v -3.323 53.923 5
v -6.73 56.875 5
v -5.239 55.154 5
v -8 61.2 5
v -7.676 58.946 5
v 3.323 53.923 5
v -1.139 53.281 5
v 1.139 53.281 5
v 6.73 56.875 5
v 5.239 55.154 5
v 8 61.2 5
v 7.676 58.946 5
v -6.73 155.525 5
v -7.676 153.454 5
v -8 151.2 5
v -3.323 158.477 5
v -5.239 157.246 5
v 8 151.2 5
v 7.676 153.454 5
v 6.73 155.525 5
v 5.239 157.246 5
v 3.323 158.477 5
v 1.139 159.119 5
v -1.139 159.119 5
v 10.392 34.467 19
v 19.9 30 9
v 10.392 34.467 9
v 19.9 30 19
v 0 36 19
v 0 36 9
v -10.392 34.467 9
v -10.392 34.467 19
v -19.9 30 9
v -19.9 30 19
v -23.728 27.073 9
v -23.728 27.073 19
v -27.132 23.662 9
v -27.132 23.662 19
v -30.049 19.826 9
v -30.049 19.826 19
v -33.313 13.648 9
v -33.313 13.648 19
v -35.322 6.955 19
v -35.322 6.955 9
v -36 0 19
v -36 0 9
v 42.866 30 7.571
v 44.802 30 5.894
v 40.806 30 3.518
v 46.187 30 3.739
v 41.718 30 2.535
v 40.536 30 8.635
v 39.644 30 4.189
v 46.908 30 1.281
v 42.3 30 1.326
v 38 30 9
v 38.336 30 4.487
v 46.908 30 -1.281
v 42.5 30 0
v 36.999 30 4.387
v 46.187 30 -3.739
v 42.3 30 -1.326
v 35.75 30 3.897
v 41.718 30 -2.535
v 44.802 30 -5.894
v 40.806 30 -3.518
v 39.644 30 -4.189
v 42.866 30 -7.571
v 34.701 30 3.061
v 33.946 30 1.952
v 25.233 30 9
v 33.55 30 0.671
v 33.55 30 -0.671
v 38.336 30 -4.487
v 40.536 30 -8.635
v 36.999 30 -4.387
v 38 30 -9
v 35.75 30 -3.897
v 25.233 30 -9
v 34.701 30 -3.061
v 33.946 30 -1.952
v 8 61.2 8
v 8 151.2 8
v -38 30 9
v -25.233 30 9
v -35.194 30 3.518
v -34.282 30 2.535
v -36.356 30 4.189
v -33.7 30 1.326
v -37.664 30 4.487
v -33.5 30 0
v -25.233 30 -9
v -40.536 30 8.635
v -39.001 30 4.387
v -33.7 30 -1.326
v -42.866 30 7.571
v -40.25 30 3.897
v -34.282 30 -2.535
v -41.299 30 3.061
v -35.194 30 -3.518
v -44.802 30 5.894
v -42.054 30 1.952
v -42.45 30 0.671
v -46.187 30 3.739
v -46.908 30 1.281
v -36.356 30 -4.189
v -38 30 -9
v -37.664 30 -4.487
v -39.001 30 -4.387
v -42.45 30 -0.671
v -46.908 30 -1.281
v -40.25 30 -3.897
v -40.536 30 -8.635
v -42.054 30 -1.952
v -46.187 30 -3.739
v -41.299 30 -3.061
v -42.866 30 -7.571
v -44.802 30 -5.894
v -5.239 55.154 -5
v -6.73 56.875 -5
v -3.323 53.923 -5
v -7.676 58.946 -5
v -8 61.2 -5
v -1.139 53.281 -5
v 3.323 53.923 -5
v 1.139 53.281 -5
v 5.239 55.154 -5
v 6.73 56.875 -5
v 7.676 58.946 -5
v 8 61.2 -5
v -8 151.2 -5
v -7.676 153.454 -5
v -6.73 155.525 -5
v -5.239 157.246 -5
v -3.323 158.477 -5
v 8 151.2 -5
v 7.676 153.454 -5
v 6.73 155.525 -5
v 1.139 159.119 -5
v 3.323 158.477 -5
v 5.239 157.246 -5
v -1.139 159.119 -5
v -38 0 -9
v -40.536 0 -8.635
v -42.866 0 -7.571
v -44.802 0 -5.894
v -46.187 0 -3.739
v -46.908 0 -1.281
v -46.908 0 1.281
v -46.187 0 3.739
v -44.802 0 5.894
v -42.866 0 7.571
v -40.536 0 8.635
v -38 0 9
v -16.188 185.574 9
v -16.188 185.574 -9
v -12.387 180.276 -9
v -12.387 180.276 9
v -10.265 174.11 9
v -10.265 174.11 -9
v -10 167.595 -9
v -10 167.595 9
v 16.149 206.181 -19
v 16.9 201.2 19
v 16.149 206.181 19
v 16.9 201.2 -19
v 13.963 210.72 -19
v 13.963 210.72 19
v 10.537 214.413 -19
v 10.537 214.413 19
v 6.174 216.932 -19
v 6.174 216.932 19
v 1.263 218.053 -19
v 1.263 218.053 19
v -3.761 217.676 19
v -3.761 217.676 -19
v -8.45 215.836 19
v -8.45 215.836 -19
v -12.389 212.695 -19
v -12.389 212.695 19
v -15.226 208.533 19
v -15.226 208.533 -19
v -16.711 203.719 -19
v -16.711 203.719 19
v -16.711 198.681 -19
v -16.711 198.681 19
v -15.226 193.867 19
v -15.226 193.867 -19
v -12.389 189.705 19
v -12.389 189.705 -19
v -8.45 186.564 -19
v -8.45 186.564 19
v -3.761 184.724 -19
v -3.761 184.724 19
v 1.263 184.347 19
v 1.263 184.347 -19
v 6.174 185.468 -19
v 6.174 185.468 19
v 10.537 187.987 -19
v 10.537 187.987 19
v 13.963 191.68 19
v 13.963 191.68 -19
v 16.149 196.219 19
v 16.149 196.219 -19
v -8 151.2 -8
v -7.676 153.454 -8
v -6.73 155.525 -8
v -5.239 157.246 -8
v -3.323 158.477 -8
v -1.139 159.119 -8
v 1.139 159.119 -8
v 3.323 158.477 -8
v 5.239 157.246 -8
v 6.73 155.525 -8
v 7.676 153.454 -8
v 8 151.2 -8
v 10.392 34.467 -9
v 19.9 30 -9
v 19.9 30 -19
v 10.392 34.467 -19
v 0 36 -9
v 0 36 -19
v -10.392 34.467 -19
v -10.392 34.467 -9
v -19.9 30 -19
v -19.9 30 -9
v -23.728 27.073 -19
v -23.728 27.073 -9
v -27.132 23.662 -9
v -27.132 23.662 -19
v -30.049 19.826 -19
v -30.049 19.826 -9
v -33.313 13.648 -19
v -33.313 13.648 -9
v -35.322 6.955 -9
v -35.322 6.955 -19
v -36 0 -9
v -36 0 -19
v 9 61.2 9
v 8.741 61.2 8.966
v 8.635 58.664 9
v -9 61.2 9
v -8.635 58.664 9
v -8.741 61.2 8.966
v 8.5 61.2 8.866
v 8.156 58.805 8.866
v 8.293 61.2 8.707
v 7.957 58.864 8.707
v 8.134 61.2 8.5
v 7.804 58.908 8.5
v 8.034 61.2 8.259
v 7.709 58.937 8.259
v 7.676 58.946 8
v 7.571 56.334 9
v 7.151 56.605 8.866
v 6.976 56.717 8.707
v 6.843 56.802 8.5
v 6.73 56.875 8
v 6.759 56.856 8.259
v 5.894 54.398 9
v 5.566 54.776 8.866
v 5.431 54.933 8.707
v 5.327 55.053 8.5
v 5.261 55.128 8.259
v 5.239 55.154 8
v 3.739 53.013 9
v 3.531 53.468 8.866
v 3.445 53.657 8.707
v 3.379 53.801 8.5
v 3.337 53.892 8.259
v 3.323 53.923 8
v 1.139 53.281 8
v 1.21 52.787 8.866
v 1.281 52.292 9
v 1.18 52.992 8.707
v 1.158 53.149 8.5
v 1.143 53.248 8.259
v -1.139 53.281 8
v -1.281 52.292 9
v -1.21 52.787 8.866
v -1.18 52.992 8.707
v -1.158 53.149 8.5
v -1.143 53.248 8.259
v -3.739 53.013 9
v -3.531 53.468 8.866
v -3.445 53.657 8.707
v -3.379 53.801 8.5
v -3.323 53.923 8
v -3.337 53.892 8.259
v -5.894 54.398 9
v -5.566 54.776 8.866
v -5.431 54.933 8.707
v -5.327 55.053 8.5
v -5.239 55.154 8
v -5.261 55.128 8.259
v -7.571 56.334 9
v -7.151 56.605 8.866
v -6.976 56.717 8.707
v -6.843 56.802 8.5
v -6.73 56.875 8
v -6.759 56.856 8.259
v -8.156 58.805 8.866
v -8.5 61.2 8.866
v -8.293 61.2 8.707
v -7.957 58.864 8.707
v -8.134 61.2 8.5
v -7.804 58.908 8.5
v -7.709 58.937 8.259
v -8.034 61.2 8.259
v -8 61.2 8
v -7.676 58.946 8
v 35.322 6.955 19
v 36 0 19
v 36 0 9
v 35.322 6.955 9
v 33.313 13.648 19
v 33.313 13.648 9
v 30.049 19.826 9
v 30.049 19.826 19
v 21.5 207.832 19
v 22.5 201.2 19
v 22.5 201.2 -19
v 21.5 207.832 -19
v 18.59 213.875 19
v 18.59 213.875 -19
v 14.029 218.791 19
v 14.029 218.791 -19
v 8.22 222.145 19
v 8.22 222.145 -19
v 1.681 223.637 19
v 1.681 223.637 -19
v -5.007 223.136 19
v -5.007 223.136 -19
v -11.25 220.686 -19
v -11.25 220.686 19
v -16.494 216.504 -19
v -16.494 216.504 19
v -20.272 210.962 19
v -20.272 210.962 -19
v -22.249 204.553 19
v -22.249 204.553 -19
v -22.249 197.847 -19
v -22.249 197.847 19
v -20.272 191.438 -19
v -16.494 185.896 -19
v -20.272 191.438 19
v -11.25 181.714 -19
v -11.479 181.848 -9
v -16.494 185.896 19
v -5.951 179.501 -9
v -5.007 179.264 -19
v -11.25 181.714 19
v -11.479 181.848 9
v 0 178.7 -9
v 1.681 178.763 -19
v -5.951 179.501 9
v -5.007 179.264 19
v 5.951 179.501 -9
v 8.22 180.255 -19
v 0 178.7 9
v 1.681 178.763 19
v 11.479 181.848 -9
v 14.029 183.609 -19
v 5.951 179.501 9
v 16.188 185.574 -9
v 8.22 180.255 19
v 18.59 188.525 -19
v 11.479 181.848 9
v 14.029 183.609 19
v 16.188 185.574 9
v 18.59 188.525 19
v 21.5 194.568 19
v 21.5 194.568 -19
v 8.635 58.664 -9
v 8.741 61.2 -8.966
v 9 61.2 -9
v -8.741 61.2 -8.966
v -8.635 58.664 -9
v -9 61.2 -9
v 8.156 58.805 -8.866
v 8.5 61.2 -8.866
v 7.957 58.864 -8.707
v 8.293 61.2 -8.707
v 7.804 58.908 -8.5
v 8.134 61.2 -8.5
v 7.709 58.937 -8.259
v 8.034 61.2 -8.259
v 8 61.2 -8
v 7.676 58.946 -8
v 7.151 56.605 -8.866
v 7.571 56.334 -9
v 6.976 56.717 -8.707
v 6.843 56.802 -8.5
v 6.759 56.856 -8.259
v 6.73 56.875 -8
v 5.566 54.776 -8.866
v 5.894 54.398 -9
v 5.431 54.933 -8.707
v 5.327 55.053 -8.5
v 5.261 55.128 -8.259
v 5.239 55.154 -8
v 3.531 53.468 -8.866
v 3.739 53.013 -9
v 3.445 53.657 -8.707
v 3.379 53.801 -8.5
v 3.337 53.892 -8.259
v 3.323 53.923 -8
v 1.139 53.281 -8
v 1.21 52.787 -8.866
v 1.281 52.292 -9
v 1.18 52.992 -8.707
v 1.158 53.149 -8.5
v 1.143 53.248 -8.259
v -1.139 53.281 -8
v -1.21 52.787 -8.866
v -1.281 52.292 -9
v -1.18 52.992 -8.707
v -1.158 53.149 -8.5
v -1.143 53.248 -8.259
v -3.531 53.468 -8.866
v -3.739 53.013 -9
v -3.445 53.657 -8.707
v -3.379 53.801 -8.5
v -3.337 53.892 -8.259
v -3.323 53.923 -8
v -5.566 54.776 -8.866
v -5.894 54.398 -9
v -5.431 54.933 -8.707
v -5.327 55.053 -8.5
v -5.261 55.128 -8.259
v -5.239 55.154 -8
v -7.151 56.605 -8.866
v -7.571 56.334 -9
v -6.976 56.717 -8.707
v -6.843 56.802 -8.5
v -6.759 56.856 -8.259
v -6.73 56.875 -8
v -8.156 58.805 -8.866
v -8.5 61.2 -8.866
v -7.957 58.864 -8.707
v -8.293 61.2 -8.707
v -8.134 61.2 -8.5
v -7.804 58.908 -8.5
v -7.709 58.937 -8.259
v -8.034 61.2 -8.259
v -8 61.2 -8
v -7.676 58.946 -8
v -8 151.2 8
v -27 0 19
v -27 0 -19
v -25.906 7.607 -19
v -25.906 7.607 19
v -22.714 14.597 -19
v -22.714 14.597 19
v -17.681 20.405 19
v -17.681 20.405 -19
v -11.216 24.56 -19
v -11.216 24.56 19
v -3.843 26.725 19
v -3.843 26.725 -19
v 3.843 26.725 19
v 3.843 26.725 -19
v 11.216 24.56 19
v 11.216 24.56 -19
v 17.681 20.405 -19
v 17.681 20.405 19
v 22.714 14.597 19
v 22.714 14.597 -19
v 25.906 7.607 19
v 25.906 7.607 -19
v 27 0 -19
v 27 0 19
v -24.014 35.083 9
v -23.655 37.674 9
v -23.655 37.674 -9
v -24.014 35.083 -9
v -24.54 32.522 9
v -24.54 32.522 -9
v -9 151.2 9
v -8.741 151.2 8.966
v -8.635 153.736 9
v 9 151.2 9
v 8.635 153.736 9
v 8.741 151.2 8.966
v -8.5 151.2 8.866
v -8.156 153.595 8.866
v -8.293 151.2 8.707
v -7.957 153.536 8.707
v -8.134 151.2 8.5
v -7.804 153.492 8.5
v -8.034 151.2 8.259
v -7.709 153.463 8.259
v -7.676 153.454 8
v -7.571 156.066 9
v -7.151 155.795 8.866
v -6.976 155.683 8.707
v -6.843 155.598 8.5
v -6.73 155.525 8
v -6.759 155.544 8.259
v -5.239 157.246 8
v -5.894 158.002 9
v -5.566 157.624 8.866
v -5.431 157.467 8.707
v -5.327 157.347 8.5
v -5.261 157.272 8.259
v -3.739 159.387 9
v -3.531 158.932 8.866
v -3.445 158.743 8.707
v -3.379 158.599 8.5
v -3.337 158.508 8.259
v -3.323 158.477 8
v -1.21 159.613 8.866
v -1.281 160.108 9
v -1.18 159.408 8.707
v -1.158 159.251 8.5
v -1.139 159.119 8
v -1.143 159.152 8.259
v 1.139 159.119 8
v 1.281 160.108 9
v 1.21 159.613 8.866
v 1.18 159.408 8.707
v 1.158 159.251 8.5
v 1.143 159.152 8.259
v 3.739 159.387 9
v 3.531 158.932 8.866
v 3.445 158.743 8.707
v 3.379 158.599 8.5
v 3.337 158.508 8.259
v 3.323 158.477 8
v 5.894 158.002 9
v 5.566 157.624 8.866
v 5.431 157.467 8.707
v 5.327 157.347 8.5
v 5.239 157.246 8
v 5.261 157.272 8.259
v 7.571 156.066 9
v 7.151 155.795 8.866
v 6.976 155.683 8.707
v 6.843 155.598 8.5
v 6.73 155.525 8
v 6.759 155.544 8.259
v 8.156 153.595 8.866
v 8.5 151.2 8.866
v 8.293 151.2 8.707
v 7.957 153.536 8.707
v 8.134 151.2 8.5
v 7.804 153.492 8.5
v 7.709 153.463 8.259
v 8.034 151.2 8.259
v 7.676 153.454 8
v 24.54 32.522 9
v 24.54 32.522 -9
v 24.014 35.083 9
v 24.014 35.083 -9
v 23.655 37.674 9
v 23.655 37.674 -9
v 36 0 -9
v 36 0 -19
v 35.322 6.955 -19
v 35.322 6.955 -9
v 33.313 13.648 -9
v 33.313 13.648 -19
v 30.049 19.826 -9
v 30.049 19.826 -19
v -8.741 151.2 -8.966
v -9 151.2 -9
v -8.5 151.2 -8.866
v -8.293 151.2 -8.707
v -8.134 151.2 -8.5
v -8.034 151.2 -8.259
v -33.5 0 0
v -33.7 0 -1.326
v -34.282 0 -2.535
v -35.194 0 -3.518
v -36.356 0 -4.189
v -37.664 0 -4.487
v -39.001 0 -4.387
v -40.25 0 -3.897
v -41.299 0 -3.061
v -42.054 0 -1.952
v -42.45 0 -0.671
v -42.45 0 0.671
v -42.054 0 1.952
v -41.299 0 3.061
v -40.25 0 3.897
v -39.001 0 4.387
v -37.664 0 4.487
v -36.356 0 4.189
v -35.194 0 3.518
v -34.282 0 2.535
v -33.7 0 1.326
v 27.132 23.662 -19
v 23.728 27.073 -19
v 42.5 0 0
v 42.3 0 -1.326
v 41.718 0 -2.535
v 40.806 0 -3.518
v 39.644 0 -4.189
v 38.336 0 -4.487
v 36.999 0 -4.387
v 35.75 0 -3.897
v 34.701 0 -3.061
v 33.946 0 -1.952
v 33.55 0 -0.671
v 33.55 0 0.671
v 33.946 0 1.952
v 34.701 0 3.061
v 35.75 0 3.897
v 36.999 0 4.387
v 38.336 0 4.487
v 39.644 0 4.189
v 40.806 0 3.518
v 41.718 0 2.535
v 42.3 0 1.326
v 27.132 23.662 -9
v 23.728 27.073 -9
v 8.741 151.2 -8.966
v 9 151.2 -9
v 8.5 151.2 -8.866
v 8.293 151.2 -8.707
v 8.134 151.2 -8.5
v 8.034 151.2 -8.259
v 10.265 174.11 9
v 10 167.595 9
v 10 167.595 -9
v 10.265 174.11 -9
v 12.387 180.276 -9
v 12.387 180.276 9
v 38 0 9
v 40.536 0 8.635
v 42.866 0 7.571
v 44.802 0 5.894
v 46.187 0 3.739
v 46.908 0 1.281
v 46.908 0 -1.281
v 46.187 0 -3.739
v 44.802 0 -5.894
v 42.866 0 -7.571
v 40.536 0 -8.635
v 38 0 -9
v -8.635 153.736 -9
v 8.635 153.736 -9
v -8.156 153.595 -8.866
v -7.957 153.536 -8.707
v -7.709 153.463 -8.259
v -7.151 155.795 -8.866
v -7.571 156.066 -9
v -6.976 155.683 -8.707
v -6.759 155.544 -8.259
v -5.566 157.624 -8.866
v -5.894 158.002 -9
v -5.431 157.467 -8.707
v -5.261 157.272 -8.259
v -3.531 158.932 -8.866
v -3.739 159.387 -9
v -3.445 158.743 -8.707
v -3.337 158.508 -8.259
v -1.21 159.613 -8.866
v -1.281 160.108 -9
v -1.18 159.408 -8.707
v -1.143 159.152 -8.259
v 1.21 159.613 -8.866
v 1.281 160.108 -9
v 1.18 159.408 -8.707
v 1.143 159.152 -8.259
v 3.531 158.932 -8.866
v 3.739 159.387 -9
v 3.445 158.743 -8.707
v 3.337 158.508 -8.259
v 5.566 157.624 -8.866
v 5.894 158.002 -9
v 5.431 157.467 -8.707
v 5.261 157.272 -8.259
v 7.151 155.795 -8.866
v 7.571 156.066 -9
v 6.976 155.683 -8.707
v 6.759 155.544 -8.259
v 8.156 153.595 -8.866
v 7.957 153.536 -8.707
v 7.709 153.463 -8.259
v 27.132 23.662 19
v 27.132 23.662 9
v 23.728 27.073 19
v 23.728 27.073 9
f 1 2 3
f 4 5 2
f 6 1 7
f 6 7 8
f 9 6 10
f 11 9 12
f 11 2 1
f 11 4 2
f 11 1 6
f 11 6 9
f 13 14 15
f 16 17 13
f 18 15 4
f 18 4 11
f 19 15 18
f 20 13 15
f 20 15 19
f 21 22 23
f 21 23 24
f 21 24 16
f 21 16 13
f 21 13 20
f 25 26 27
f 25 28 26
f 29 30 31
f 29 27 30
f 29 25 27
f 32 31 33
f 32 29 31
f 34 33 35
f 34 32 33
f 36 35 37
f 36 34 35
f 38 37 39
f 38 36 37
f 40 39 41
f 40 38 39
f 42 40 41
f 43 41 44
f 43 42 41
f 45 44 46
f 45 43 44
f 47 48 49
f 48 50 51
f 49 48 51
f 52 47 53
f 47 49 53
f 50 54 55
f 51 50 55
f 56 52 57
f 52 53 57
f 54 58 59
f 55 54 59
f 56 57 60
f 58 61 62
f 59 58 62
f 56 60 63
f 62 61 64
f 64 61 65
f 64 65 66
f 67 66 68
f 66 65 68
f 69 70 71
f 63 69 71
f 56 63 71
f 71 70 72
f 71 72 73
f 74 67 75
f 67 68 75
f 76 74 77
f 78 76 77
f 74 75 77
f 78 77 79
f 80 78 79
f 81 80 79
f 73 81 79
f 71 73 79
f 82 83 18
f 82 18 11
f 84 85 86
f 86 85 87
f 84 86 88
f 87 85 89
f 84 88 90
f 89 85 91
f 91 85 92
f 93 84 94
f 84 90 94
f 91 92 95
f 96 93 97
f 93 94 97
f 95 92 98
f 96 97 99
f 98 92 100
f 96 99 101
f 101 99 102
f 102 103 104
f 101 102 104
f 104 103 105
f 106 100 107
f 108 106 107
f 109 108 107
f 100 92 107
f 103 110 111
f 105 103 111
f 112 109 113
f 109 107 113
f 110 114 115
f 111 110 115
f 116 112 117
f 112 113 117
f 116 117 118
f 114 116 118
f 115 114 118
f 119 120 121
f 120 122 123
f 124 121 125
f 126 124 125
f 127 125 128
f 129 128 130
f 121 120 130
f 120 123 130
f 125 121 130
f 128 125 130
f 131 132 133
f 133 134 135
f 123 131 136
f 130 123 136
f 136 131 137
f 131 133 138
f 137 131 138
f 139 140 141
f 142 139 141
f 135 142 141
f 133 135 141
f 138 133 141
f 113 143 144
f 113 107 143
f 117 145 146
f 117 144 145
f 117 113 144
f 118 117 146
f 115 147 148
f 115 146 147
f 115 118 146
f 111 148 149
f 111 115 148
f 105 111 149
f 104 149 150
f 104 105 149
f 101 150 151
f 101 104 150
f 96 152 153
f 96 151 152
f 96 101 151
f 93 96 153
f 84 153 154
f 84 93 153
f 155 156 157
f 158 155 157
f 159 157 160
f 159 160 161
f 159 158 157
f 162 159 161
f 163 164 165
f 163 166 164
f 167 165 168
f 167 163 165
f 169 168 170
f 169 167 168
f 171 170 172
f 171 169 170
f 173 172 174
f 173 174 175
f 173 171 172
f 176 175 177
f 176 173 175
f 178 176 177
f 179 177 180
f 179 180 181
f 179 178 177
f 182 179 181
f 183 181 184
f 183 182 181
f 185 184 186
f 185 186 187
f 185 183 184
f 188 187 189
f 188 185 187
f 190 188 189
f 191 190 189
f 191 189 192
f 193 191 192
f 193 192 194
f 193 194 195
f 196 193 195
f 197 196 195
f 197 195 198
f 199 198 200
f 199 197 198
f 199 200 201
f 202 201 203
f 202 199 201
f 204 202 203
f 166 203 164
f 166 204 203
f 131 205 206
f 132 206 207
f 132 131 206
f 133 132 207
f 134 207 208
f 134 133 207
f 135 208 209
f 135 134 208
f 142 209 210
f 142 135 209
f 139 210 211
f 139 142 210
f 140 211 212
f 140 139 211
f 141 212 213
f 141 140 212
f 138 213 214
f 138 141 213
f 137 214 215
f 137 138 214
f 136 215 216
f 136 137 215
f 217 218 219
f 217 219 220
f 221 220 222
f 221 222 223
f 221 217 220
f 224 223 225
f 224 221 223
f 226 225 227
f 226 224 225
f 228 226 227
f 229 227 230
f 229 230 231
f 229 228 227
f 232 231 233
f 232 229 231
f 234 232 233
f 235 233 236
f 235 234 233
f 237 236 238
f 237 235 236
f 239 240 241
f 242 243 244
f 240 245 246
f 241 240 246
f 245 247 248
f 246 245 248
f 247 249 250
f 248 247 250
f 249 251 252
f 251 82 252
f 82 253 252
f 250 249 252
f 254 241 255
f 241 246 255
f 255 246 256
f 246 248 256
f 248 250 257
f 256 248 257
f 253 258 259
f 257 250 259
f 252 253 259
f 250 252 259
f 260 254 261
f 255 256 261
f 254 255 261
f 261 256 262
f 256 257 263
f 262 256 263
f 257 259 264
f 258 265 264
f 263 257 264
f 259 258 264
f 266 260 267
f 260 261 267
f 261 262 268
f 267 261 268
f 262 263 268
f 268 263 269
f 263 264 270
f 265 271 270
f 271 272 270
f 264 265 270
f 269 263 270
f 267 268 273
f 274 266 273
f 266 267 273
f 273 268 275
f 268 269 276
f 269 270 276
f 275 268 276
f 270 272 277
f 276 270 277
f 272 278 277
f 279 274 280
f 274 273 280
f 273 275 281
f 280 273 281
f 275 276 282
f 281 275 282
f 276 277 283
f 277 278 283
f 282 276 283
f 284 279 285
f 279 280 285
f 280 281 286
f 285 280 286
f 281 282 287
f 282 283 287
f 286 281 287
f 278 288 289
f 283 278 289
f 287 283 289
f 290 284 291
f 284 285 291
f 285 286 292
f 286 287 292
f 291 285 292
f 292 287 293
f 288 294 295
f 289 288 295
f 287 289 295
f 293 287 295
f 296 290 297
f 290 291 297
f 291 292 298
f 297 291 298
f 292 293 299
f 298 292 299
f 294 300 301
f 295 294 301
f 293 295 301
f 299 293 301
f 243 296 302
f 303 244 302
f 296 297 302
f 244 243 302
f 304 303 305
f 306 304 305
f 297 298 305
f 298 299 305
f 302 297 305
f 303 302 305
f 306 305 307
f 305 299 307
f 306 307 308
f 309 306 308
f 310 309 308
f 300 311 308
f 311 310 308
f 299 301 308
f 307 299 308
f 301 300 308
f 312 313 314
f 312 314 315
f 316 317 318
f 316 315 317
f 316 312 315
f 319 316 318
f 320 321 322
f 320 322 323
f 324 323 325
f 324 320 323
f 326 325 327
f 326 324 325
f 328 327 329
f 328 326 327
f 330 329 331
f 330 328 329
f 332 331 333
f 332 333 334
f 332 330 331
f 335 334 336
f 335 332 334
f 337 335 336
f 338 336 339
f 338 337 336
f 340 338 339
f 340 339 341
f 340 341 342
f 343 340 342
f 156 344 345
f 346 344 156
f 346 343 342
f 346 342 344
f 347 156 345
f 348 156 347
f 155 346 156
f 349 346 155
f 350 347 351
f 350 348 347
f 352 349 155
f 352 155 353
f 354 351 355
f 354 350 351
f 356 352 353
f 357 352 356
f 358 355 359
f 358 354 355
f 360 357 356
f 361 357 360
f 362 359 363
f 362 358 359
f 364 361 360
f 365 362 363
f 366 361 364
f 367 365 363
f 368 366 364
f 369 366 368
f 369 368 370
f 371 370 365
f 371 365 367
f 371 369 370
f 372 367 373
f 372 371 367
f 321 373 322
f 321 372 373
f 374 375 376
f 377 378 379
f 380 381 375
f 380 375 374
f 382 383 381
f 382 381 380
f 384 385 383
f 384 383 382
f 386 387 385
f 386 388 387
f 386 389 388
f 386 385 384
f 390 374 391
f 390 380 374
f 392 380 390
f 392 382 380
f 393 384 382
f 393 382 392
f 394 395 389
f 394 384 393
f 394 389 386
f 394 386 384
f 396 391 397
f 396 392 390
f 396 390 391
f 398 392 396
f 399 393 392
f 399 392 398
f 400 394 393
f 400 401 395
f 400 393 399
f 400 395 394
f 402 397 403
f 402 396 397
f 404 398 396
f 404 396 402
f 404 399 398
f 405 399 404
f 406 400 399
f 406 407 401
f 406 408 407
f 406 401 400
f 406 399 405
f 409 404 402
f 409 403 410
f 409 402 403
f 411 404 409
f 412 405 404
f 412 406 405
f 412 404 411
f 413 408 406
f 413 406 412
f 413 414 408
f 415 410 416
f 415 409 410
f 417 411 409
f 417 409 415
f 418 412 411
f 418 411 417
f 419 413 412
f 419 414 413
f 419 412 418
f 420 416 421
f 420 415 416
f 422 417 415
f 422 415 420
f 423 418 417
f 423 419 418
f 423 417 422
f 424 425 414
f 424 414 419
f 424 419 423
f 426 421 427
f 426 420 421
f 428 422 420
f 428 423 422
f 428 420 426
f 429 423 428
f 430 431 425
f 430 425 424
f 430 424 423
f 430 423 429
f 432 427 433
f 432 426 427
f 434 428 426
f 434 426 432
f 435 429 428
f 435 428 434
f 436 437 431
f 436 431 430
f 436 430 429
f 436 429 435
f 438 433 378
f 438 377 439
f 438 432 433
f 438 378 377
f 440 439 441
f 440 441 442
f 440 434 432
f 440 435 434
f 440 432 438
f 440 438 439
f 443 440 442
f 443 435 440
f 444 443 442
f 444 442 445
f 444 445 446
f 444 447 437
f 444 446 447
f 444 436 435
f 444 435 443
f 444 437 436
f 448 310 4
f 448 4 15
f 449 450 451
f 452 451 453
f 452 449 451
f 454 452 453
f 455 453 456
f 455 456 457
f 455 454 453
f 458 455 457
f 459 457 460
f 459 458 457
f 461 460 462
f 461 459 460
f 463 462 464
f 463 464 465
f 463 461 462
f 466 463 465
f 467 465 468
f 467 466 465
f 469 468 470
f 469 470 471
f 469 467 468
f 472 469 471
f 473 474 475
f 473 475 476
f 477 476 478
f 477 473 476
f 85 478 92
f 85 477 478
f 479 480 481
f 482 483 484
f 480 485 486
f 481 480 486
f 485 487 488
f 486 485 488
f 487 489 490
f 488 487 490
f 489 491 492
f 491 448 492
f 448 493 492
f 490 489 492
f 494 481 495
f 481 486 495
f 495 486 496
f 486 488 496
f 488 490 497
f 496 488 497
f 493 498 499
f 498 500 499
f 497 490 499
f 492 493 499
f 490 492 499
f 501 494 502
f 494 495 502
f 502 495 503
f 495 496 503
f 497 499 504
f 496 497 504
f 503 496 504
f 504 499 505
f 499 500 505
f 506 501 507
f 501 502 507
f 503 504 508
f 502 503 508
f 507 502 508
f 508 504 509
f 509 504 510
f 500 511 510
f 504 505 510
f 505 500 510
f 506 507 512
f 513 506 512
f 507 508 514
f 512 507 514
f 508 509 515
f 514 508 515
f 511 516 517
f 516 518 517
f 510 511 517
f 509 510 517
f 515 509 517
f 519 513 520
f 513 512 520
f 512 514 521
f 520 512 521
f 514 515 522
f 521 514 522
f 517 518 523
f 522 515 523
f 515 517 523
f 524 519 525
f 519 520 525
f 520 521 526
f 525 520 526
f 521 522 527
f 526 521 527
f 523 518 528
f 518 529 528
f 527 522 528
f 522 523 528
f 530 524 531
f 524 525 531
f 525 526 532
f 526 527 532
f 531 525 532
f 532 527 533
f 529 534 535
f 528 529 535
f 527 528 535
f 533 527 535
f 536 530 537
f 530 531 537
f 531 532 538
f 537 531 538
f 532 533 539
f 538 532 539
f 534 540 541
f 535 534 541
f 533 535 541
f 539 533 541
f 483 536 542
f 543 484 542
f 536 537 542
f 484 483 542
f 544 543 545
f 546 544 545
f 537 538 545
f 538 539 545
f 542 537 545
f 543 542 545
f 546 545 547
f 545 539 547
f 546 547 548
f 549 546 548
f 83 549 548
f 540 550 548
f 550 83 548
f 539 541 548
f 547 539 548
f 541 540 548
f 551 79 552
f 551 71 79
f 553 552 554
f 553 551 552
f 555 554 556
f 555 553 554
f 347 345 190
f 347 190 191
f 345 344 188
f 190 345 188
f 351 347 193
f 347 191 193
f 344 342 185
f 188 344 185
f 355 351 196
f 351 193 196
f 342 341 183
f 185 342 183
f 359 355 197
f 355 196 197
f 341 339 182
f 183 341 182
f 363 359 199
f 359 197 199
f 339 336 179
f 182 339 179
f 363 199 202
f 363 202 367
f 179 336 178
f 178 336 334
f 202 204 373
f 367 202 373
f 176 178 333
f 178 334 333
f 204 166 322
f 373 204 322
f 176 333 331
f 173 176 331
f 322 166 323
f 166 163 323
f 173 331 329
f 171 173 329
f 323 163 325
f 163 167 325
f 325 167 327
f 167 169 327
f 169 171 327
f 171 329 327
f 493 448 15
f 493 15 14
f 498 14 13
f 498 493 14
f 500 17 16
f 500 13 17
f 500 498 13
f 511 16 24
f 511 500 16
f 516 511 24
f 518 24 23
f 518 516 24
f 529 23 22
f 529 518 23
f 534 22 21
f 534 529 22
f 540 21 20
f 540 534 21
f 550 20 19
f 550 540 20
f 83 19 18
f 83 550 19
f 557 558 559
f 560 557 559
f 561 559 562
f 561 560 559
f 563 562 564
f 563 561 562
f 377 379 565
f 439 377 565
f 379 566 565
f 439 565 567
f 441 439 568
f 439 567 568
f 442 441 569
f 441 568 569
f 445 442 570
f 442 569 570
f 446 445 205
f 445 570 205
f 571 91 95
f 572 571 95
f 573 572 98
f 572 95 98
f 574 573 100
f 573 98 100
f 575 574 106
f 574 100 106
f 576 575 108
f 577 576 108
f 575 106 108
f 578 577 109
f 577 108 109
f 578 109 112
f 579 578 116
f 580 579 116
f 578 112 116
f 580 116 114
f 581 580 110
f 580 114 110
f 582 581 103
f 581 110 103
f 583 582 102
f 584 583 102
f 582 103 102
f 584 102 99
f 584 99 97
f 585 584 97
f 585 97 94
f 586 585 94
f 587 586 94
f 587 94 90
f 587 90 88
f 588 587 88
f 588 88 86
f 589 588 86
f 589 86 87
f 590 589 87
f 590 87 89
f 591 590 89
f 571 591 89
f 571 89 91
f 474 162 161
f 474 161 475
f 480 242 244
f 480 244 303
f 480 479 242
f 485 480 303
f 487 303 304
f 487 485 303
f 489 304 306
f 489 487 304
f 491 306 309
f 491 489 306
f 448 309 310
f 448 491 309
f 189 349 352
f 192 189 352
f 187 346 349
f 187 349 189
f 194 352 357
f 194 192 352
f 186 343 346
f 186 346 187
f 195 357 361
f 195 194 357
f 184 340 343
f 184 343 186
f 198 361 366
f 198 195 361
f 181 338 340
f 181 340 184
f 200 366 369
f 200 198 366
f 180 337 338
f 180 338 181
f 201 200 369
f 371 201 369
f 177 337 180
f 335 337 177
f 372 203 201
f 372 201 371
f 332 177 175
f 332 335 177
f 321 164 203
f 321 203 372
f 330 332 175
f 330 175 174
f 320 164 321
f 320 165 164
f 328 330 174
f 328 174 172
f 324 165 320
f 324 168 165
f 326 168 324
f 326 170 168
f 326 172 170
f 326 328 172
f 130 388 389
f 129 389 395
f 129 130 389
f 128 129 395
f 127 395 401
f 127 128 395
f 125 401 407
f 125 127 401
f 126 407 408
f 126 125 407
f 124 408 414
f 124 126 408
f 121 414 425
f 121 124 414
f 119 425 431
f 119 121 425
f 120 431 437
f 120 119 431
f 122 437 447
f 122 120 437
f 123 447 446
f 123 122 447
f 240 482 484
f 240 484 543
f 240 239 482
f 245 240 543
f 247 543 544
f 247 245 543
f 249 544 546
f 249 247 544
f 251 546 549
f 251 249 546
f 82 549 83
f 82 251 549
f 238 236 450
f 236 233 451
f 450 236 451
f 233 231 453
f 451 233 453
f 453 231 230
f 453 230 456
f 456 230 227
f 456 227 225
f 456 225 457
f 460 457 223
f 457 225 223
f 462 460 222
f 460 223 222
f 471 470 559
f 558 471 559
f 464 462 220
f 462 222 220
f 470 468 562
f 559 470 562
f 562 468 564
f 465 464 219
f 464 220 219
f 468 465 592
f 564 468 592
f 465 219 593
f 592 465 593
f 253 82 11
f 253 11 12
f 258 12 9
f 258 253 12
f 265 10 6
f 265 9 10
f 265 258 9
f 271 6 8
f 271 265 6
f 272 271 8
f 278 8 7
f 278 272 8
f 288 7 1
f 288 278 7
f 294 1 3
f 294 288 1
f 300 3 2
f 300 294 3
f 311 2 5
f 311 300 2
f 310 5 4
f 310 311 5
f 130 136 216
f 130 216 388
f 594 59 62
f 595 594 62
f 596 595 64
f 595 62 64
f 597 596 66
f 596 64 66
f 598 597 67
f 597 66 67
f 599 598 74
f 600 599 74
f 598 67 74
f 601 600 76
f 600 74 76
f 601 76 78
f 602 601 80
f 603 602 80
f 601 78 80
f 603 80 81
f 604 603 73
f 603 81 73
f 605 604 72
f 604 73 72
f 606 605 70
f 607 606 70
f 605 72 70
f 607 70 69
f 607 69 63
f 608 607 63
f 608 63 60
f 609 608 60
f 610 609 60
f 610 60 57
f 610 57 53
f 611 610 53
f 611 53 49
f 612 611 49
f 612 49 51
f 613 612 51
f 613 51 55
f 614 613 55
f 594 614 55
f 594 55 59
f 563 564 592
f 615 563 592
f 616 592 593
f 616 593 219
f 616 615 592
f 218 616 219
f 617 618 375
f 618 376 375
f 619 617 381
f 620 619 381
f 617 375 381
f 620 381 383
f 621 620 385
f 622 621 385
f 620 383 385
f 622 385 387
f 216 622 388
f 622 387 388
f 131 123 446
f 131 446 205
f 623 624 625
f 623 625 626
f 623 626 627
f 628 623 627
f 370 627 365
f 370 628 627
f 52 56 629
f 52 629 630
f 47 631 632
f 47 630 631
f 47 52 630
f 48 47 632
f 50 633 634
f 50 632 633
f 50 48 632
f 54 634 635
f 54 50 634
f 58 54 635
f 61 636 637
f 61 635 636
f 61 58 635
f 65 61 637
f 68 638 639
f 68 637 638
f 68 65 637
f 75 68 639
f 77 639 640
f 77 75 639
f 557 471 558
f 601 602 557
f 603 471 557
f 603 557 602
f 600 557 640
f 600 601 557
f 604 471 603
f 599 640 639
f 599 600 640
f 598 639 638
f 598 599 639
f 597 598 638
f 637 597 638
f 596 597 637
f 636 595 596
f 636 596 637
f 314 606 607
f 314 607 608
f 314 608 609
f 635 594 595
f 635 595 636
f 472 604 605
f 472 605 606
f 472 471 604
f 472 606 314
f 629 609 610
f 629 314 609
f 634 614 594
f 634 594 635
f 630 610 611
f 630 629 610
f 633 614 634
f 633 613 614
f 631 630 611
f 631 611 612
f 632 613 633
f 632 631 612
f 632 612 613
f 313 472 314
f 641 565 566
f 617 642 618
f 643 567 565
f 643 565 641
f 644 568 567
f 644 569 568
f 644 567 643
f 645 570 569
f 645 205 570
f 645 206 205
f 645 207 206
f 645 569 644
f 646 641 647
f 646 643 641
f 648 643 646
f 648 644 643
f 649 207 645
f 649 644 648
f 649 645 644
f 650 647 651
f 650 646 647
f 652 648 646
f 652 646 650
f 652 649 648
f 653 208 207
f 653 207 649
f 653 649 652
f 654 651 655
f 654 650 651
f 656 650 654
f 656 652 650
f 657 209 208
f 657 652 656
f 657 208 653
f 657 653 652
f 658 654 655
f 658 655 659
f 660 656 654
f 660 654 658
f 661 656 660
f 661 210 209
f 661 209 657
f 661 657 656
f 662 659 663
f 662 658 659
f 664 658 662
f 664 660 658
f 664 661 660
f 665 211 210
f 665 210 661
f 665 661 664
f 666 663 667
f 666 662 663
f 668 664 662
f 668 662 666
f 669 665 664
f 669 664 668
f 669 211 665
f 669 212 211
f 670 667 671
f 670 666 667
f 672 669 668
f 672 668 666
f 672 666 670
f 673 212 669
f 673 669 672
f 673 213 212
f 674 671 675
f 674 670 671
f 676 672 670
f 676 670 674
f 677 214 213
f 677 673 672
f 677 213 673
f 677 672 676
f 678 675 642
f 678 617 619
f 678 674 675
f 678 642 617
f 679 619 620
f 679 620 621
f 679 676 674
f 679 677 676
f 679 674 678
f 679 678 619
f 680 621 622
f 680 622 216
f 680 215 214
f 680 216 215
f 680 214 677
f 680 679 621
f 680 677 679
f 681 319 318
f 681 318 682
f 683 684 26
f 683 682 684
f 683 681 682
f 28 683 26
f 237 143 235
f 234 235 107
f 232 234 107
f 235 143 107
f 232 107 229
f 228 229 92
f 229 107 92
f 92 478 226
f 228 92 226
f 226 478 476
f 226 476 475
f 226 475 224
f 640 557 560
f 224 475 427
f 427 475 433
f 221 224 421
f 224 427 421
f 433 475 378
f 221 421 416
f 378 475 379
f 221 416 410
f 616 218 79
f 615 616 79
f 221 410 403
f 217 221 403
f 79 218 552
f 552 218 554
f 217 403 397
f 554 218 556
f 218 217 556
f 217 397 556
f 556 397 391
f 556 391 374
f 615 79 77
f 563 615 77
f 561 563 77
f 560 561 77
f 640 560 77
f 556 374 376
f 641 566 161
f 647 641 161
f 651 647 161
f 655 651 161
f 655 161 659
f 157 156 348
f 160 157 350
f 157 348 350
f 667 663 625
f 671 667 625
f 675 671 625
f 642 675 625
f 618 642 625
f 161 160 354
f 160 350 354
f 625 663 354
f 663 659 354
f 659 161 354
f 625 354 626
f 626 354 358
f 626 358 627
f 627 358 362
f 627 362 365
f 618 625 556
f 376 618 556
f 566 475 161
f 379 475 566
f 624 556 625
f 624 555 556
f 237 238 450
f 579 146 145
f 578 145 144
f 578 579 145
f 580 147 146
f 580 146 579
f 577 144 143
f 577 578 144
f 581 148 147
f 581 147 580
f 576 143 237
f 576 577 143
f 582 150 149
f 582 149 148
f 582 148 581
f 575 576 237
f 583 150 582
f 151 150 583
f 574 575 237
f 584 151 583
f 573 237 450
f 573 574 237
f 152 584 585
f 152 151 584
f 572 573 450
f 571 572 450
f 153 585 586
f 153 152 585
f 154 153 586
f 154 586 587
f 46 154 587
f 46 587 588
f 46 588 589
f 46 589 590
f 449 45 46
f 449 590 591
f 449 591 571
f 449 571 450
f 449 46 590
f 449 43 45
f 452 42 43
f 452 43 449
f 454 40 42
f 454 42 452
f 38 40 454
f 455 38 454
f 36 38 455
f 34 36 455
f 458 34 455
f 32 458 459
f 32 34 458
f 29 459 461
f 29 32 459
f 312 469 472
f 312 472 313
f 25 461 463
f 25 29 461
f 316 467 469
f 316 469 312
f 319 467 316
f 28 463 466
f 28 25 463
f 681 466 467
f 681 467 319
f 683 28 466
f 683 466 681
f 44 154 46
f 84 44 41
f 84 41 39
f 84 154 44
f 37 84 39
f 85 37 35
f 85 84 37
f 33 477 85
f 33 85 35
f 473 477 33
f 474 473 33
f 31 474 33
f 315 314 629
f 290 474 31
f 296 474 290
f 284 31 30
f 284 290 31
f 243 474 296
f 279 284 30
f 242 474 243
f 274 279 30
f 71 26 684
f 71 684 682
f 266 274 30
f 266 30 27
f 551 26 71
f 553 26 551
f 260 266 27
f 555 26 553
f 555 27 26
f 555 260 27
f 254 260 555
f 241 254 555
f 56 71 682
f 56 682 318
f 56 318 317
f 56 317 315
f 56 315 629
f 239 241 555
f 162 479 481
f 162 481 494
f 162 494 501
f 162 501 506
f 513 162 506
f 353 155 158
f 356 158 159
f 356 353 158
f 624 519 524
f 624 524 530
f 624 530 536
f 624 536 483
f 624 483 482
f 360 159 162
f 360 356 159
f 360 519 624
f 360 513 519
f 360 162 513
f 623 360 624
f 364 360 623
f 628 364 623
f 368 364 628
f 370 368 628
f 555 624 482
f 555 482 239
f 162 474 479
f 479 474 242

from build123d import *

# Parameters (mm, degrees)
SKETCH1_R              = 22.5
SKETCH1_R_2            = 16.9
BOSS_EXTRUDE1_DEPTH    = 19
BOSS_EXTRUDE1_2_DEPTH  = 19
BOSS_EXTRUDE2_DEPTH    = 9
BOSS_EXTRUDE3_DEPTH    = 9
FILLET1_RADIUS         = 9
FILLET1_LENGTH         = 30
FILLET2_RADIUS         = 9
FILLET2_LENGTH         = 30
BOSS_EXTRUDE4_DEPTH    = 5
FILLET3_R              = 1
M10X1_5_TAPPED_HOLE1_D = 9


with BuildPart() as part:
    # Sketch1 → Boss-Extrude1 (new, symmetric)
    with BuildSketch(Plane.XY):
        with Locations((0, 201.2)):
            Circle(SKETCH1_R)
        with Locations((0, 201.2)):
            Circle(SKETCH1_R_2, mode=Mode.SUBTRACT)
    extrude(amount=BOSS_EXTRUDE1_DEPTH, both=True)



with BuildPart() as body_2:
    # Sketch1 → Boss-Extrude1 2 (new, symmetric)
    with BuildSketch(Plane.XY):
        with BuildLine():
            ThreePointArc((30.048695698, 19.826141501), (25.487028558, 25.424621439), (19.899748742, 30))
            ThreePointArc((19.899748742, 30), (0, 36), (-19.899748742, 30))
            ThreePointArc((-19.899748742, 30), (-25.487028558, 25.424621439), (-30.048695698, 19.826141501))
            ThreePointArc((-30.048695698, 19.826141501), (-34.480088784, 10.350047219), (-36, 0))
            Line((-36, 0), (-27, 0))
            ThreePointArc((-27, 0), (0, 27), (27, 0))
            Line((27, 0), (36, 0))
            ThreePointArc((36, 0), (34.480088784, 10.350047219), (30.048695698, 19.826141501))
        make_face()
    extrude(amount=BOSS_EXTRUDE1_2_DEPTH, both=True)


with BuildPart() as part_1:
    add(part.part)

    add(body_2.part)  # Boss-Extrude2 merges body 2
    # Sketch1<3> → Boss-Extrude2 (add, symmetric)
    with BuildSketch(Plane.XY):
        with BuildLine():
            Line((23.655259549, 37.674049083), (10, 167.595165145))
            ThreePointArc((10, 167.595165145), (11.1018188, 177.270143397), (16.188371323, 185.573527784))
            ThreePointArc((16.188371323, 185.573527784), (0, 178.7), (-16.188371323, 185.573527784))
            ThreePointArc((-16.188371323, 185.573527784), (-11.1018188, 177.270143397), (-10, 167.595165145))
            Line((-10, 167.595165145), (-23.655259549, 37.674049083))
            ThreePointArc((-23.655259549, 37.674049083), (-24.2559556, 33.798295304), (-25.233327526, 30))
            Line((-25.233327526, 30), (-19.899748742, 30))
            ThreePointArc((-19.899748742, 30), (0, 36), (19.899748742, 30))
            Line((19.899748742, 30), (25.233327526, 30))
            ThreePointArc((25.233327526, 30), (24.2559556, 33.798295304), (23.655259549, 37.674049083))
        make_face()
        with BuildLine():
            ThreePointArc((-8, 151.2), (0, 159.2), (8, 151.2))
            Line((8, 151.2), (8, 61.2))
            ThreePointArc((8, 61.2), (0, 53.2), (-8, 61.2))
            Line((-8, 61.2), (-8, 151.2))
        make_face(mode=Mode.SUBTRACT)
    extrude(amount=BOSS_EXTRUDE2_DEPTH, both=True)

    # Sketch1<4> → Boss-Extrude3 (add, symmetric)
    with BuildSketch(Plane.XY):
        with BuildLine():
            Line((47, 30), (25.233327526, 30))
            ThreePointArc((25.233327526, 30), (27.281360664, 24.742845095), (30.048695698, 19.826141501))
            ThreePointArc((30.048695698, 19.826141501), (34.480088784, 10.350047219), (36, 0))
            Line((36, 0), (47, 0))
            Line((47, 0), (47, 30))
        make_face()
        with BuildLine():
            ThreePointArc((30.048695698, 19.826141501), (27.281360664, 24.742845095), (25.233327526, 30))
            Line((25.233327526, 30), (19.899748742, 30))
            ThreePointArc((19.899748742, 30), (25.487028558, 25.424621439), (30.048695698, 19.826141501))
        make_face()
        with BuildLine():
            ThreePointArc((-30.048695698, 19.826141501), (-25.487028558, 25.424621439), (-19.899748742, 30))
            Line((-19.899748742, 30), (-25.233327526, 30))
            ThreePointArc((-25.233327526, 30), (-27.281360664, 24.742845095), (-30.048695698, 19.826141501))
        make_face()
        with BuildLine():
            ThreePointArc((-30.048695698, 19.826141501), (-27.281360664, 24.742845095), (-25.233327526, 30))
            Line((-25.233327526, 30), (-47, 30))
            Line((-47, 30), (-47, 0))
            Line((-47, 0), (-36, 0))
            ThreePointArc((-36, 0), (-34.480088784, 10.350047219), (-30.048695698, 19.826141501))
        make_face()
    extrude(amount=BOSS_EXTRUDE3_DEPTH, both=True)

    # Fillet1: full round fillet: the end face becomes a half cylinder, R = half its width
    fillet1_face = Plane((-47, 15, 0), x_dir=(0, 1, 0), z_dir=(-1, 0, 0))  # on the end face: x along it, z out of the body
    fillet1_slab = fillet1_face.offset(-FILLET1_RADIUS / 2) * Box(FILLET1_LENGTH, 2 * FILLET1_RADIUS, FILLET1_RADIUS, mode=Mode.PRIVATE)  # the body's end, R deep
    fillet1_round = Plane((-38, 15, 0), x_dir=(-1, 0, 0), z_dir=(0, 1, 0)) * Cylinder(FILLET1_RADIUS, FILLET1_LENGTH, mode=Mode.PRIVATE)  # its axis R under the face
    add(fillet1_slab - fillet1_round, mode=Mode.SUBTRACT)

    # Fillet2: full round fillet: the end face becomes a half cylinder, R = half its width
    fillet2_face = Plane((47, 15, 0), x_dir=(0, 1, 0), z_dir=(1, 0, 0))  # on the end face: x along it, z out of the body
    fillet2_slab = fillet2_face.offset(-FILLET2_RADIUS / 2) * Box(FILLET2_LENGTH, 2 * FILLET2_RADIUS, FILLET2_RADIUS, mode=Mode.PRIVATE)  # the body's end, R deep
    fillet2_round = Plane((38, 15, 0), x_dir=(1, 0, 0), z_dir=(0, 1, 0)) * Cylinder(FILLET2_RADIUS, FILLET2_LENGTH, mode=Mode.PRIVATE)  # its axis R under the face
    add(fillet2_slab - fillet2_round, mode=Mode.SUBTRACT)

    # Sketch1<5> → Boss-Extrude4 (add, symmetric)
    with BuildSketch(Plane.XY):
        with BuildLine():
            Line((-8, 151.2), (-8, 61.2))
            ThreePointArc((-8, 61.2), (0, 53.2), (8, 61.2))
            Line((8, 61.2), (8, 151.2))
            ThreePointArc((8, 151.2), (0, 159.2), (-8, 151.2))
        make_face()
    extrude(amount=BOSS_EXTRUDE4_DEPTH, both=True)

    # Fillet3
    fillet3_edges = [part_1.edges().sort_by_distance(p)[0] for p in [
        (0, 53.2, 9),
        (-8, 106.2, 9),
        (0, 159.2, 9),
        (8, 106.2, -9),
        (8, 106.2, 9),
        (0, 53.2, -9),
        (0, 159.2, -9),
        (-8, 106.2, -9),
    ]]
    fillet(fillet3_edges, radius=FILLET3_R)

    # M10x1.5 Tapped Hole1 (through all)
    with Locations(Plane(origin=(0, 0, 0), x_dir=(-1, 0, 0), z_dir=(0, -1, 0))):
        with Locations((-38, 0), (38, 0)):
            Hole(M10X1_5_TAPPED_HOLE1_D / 2)


solid = part_1.part
